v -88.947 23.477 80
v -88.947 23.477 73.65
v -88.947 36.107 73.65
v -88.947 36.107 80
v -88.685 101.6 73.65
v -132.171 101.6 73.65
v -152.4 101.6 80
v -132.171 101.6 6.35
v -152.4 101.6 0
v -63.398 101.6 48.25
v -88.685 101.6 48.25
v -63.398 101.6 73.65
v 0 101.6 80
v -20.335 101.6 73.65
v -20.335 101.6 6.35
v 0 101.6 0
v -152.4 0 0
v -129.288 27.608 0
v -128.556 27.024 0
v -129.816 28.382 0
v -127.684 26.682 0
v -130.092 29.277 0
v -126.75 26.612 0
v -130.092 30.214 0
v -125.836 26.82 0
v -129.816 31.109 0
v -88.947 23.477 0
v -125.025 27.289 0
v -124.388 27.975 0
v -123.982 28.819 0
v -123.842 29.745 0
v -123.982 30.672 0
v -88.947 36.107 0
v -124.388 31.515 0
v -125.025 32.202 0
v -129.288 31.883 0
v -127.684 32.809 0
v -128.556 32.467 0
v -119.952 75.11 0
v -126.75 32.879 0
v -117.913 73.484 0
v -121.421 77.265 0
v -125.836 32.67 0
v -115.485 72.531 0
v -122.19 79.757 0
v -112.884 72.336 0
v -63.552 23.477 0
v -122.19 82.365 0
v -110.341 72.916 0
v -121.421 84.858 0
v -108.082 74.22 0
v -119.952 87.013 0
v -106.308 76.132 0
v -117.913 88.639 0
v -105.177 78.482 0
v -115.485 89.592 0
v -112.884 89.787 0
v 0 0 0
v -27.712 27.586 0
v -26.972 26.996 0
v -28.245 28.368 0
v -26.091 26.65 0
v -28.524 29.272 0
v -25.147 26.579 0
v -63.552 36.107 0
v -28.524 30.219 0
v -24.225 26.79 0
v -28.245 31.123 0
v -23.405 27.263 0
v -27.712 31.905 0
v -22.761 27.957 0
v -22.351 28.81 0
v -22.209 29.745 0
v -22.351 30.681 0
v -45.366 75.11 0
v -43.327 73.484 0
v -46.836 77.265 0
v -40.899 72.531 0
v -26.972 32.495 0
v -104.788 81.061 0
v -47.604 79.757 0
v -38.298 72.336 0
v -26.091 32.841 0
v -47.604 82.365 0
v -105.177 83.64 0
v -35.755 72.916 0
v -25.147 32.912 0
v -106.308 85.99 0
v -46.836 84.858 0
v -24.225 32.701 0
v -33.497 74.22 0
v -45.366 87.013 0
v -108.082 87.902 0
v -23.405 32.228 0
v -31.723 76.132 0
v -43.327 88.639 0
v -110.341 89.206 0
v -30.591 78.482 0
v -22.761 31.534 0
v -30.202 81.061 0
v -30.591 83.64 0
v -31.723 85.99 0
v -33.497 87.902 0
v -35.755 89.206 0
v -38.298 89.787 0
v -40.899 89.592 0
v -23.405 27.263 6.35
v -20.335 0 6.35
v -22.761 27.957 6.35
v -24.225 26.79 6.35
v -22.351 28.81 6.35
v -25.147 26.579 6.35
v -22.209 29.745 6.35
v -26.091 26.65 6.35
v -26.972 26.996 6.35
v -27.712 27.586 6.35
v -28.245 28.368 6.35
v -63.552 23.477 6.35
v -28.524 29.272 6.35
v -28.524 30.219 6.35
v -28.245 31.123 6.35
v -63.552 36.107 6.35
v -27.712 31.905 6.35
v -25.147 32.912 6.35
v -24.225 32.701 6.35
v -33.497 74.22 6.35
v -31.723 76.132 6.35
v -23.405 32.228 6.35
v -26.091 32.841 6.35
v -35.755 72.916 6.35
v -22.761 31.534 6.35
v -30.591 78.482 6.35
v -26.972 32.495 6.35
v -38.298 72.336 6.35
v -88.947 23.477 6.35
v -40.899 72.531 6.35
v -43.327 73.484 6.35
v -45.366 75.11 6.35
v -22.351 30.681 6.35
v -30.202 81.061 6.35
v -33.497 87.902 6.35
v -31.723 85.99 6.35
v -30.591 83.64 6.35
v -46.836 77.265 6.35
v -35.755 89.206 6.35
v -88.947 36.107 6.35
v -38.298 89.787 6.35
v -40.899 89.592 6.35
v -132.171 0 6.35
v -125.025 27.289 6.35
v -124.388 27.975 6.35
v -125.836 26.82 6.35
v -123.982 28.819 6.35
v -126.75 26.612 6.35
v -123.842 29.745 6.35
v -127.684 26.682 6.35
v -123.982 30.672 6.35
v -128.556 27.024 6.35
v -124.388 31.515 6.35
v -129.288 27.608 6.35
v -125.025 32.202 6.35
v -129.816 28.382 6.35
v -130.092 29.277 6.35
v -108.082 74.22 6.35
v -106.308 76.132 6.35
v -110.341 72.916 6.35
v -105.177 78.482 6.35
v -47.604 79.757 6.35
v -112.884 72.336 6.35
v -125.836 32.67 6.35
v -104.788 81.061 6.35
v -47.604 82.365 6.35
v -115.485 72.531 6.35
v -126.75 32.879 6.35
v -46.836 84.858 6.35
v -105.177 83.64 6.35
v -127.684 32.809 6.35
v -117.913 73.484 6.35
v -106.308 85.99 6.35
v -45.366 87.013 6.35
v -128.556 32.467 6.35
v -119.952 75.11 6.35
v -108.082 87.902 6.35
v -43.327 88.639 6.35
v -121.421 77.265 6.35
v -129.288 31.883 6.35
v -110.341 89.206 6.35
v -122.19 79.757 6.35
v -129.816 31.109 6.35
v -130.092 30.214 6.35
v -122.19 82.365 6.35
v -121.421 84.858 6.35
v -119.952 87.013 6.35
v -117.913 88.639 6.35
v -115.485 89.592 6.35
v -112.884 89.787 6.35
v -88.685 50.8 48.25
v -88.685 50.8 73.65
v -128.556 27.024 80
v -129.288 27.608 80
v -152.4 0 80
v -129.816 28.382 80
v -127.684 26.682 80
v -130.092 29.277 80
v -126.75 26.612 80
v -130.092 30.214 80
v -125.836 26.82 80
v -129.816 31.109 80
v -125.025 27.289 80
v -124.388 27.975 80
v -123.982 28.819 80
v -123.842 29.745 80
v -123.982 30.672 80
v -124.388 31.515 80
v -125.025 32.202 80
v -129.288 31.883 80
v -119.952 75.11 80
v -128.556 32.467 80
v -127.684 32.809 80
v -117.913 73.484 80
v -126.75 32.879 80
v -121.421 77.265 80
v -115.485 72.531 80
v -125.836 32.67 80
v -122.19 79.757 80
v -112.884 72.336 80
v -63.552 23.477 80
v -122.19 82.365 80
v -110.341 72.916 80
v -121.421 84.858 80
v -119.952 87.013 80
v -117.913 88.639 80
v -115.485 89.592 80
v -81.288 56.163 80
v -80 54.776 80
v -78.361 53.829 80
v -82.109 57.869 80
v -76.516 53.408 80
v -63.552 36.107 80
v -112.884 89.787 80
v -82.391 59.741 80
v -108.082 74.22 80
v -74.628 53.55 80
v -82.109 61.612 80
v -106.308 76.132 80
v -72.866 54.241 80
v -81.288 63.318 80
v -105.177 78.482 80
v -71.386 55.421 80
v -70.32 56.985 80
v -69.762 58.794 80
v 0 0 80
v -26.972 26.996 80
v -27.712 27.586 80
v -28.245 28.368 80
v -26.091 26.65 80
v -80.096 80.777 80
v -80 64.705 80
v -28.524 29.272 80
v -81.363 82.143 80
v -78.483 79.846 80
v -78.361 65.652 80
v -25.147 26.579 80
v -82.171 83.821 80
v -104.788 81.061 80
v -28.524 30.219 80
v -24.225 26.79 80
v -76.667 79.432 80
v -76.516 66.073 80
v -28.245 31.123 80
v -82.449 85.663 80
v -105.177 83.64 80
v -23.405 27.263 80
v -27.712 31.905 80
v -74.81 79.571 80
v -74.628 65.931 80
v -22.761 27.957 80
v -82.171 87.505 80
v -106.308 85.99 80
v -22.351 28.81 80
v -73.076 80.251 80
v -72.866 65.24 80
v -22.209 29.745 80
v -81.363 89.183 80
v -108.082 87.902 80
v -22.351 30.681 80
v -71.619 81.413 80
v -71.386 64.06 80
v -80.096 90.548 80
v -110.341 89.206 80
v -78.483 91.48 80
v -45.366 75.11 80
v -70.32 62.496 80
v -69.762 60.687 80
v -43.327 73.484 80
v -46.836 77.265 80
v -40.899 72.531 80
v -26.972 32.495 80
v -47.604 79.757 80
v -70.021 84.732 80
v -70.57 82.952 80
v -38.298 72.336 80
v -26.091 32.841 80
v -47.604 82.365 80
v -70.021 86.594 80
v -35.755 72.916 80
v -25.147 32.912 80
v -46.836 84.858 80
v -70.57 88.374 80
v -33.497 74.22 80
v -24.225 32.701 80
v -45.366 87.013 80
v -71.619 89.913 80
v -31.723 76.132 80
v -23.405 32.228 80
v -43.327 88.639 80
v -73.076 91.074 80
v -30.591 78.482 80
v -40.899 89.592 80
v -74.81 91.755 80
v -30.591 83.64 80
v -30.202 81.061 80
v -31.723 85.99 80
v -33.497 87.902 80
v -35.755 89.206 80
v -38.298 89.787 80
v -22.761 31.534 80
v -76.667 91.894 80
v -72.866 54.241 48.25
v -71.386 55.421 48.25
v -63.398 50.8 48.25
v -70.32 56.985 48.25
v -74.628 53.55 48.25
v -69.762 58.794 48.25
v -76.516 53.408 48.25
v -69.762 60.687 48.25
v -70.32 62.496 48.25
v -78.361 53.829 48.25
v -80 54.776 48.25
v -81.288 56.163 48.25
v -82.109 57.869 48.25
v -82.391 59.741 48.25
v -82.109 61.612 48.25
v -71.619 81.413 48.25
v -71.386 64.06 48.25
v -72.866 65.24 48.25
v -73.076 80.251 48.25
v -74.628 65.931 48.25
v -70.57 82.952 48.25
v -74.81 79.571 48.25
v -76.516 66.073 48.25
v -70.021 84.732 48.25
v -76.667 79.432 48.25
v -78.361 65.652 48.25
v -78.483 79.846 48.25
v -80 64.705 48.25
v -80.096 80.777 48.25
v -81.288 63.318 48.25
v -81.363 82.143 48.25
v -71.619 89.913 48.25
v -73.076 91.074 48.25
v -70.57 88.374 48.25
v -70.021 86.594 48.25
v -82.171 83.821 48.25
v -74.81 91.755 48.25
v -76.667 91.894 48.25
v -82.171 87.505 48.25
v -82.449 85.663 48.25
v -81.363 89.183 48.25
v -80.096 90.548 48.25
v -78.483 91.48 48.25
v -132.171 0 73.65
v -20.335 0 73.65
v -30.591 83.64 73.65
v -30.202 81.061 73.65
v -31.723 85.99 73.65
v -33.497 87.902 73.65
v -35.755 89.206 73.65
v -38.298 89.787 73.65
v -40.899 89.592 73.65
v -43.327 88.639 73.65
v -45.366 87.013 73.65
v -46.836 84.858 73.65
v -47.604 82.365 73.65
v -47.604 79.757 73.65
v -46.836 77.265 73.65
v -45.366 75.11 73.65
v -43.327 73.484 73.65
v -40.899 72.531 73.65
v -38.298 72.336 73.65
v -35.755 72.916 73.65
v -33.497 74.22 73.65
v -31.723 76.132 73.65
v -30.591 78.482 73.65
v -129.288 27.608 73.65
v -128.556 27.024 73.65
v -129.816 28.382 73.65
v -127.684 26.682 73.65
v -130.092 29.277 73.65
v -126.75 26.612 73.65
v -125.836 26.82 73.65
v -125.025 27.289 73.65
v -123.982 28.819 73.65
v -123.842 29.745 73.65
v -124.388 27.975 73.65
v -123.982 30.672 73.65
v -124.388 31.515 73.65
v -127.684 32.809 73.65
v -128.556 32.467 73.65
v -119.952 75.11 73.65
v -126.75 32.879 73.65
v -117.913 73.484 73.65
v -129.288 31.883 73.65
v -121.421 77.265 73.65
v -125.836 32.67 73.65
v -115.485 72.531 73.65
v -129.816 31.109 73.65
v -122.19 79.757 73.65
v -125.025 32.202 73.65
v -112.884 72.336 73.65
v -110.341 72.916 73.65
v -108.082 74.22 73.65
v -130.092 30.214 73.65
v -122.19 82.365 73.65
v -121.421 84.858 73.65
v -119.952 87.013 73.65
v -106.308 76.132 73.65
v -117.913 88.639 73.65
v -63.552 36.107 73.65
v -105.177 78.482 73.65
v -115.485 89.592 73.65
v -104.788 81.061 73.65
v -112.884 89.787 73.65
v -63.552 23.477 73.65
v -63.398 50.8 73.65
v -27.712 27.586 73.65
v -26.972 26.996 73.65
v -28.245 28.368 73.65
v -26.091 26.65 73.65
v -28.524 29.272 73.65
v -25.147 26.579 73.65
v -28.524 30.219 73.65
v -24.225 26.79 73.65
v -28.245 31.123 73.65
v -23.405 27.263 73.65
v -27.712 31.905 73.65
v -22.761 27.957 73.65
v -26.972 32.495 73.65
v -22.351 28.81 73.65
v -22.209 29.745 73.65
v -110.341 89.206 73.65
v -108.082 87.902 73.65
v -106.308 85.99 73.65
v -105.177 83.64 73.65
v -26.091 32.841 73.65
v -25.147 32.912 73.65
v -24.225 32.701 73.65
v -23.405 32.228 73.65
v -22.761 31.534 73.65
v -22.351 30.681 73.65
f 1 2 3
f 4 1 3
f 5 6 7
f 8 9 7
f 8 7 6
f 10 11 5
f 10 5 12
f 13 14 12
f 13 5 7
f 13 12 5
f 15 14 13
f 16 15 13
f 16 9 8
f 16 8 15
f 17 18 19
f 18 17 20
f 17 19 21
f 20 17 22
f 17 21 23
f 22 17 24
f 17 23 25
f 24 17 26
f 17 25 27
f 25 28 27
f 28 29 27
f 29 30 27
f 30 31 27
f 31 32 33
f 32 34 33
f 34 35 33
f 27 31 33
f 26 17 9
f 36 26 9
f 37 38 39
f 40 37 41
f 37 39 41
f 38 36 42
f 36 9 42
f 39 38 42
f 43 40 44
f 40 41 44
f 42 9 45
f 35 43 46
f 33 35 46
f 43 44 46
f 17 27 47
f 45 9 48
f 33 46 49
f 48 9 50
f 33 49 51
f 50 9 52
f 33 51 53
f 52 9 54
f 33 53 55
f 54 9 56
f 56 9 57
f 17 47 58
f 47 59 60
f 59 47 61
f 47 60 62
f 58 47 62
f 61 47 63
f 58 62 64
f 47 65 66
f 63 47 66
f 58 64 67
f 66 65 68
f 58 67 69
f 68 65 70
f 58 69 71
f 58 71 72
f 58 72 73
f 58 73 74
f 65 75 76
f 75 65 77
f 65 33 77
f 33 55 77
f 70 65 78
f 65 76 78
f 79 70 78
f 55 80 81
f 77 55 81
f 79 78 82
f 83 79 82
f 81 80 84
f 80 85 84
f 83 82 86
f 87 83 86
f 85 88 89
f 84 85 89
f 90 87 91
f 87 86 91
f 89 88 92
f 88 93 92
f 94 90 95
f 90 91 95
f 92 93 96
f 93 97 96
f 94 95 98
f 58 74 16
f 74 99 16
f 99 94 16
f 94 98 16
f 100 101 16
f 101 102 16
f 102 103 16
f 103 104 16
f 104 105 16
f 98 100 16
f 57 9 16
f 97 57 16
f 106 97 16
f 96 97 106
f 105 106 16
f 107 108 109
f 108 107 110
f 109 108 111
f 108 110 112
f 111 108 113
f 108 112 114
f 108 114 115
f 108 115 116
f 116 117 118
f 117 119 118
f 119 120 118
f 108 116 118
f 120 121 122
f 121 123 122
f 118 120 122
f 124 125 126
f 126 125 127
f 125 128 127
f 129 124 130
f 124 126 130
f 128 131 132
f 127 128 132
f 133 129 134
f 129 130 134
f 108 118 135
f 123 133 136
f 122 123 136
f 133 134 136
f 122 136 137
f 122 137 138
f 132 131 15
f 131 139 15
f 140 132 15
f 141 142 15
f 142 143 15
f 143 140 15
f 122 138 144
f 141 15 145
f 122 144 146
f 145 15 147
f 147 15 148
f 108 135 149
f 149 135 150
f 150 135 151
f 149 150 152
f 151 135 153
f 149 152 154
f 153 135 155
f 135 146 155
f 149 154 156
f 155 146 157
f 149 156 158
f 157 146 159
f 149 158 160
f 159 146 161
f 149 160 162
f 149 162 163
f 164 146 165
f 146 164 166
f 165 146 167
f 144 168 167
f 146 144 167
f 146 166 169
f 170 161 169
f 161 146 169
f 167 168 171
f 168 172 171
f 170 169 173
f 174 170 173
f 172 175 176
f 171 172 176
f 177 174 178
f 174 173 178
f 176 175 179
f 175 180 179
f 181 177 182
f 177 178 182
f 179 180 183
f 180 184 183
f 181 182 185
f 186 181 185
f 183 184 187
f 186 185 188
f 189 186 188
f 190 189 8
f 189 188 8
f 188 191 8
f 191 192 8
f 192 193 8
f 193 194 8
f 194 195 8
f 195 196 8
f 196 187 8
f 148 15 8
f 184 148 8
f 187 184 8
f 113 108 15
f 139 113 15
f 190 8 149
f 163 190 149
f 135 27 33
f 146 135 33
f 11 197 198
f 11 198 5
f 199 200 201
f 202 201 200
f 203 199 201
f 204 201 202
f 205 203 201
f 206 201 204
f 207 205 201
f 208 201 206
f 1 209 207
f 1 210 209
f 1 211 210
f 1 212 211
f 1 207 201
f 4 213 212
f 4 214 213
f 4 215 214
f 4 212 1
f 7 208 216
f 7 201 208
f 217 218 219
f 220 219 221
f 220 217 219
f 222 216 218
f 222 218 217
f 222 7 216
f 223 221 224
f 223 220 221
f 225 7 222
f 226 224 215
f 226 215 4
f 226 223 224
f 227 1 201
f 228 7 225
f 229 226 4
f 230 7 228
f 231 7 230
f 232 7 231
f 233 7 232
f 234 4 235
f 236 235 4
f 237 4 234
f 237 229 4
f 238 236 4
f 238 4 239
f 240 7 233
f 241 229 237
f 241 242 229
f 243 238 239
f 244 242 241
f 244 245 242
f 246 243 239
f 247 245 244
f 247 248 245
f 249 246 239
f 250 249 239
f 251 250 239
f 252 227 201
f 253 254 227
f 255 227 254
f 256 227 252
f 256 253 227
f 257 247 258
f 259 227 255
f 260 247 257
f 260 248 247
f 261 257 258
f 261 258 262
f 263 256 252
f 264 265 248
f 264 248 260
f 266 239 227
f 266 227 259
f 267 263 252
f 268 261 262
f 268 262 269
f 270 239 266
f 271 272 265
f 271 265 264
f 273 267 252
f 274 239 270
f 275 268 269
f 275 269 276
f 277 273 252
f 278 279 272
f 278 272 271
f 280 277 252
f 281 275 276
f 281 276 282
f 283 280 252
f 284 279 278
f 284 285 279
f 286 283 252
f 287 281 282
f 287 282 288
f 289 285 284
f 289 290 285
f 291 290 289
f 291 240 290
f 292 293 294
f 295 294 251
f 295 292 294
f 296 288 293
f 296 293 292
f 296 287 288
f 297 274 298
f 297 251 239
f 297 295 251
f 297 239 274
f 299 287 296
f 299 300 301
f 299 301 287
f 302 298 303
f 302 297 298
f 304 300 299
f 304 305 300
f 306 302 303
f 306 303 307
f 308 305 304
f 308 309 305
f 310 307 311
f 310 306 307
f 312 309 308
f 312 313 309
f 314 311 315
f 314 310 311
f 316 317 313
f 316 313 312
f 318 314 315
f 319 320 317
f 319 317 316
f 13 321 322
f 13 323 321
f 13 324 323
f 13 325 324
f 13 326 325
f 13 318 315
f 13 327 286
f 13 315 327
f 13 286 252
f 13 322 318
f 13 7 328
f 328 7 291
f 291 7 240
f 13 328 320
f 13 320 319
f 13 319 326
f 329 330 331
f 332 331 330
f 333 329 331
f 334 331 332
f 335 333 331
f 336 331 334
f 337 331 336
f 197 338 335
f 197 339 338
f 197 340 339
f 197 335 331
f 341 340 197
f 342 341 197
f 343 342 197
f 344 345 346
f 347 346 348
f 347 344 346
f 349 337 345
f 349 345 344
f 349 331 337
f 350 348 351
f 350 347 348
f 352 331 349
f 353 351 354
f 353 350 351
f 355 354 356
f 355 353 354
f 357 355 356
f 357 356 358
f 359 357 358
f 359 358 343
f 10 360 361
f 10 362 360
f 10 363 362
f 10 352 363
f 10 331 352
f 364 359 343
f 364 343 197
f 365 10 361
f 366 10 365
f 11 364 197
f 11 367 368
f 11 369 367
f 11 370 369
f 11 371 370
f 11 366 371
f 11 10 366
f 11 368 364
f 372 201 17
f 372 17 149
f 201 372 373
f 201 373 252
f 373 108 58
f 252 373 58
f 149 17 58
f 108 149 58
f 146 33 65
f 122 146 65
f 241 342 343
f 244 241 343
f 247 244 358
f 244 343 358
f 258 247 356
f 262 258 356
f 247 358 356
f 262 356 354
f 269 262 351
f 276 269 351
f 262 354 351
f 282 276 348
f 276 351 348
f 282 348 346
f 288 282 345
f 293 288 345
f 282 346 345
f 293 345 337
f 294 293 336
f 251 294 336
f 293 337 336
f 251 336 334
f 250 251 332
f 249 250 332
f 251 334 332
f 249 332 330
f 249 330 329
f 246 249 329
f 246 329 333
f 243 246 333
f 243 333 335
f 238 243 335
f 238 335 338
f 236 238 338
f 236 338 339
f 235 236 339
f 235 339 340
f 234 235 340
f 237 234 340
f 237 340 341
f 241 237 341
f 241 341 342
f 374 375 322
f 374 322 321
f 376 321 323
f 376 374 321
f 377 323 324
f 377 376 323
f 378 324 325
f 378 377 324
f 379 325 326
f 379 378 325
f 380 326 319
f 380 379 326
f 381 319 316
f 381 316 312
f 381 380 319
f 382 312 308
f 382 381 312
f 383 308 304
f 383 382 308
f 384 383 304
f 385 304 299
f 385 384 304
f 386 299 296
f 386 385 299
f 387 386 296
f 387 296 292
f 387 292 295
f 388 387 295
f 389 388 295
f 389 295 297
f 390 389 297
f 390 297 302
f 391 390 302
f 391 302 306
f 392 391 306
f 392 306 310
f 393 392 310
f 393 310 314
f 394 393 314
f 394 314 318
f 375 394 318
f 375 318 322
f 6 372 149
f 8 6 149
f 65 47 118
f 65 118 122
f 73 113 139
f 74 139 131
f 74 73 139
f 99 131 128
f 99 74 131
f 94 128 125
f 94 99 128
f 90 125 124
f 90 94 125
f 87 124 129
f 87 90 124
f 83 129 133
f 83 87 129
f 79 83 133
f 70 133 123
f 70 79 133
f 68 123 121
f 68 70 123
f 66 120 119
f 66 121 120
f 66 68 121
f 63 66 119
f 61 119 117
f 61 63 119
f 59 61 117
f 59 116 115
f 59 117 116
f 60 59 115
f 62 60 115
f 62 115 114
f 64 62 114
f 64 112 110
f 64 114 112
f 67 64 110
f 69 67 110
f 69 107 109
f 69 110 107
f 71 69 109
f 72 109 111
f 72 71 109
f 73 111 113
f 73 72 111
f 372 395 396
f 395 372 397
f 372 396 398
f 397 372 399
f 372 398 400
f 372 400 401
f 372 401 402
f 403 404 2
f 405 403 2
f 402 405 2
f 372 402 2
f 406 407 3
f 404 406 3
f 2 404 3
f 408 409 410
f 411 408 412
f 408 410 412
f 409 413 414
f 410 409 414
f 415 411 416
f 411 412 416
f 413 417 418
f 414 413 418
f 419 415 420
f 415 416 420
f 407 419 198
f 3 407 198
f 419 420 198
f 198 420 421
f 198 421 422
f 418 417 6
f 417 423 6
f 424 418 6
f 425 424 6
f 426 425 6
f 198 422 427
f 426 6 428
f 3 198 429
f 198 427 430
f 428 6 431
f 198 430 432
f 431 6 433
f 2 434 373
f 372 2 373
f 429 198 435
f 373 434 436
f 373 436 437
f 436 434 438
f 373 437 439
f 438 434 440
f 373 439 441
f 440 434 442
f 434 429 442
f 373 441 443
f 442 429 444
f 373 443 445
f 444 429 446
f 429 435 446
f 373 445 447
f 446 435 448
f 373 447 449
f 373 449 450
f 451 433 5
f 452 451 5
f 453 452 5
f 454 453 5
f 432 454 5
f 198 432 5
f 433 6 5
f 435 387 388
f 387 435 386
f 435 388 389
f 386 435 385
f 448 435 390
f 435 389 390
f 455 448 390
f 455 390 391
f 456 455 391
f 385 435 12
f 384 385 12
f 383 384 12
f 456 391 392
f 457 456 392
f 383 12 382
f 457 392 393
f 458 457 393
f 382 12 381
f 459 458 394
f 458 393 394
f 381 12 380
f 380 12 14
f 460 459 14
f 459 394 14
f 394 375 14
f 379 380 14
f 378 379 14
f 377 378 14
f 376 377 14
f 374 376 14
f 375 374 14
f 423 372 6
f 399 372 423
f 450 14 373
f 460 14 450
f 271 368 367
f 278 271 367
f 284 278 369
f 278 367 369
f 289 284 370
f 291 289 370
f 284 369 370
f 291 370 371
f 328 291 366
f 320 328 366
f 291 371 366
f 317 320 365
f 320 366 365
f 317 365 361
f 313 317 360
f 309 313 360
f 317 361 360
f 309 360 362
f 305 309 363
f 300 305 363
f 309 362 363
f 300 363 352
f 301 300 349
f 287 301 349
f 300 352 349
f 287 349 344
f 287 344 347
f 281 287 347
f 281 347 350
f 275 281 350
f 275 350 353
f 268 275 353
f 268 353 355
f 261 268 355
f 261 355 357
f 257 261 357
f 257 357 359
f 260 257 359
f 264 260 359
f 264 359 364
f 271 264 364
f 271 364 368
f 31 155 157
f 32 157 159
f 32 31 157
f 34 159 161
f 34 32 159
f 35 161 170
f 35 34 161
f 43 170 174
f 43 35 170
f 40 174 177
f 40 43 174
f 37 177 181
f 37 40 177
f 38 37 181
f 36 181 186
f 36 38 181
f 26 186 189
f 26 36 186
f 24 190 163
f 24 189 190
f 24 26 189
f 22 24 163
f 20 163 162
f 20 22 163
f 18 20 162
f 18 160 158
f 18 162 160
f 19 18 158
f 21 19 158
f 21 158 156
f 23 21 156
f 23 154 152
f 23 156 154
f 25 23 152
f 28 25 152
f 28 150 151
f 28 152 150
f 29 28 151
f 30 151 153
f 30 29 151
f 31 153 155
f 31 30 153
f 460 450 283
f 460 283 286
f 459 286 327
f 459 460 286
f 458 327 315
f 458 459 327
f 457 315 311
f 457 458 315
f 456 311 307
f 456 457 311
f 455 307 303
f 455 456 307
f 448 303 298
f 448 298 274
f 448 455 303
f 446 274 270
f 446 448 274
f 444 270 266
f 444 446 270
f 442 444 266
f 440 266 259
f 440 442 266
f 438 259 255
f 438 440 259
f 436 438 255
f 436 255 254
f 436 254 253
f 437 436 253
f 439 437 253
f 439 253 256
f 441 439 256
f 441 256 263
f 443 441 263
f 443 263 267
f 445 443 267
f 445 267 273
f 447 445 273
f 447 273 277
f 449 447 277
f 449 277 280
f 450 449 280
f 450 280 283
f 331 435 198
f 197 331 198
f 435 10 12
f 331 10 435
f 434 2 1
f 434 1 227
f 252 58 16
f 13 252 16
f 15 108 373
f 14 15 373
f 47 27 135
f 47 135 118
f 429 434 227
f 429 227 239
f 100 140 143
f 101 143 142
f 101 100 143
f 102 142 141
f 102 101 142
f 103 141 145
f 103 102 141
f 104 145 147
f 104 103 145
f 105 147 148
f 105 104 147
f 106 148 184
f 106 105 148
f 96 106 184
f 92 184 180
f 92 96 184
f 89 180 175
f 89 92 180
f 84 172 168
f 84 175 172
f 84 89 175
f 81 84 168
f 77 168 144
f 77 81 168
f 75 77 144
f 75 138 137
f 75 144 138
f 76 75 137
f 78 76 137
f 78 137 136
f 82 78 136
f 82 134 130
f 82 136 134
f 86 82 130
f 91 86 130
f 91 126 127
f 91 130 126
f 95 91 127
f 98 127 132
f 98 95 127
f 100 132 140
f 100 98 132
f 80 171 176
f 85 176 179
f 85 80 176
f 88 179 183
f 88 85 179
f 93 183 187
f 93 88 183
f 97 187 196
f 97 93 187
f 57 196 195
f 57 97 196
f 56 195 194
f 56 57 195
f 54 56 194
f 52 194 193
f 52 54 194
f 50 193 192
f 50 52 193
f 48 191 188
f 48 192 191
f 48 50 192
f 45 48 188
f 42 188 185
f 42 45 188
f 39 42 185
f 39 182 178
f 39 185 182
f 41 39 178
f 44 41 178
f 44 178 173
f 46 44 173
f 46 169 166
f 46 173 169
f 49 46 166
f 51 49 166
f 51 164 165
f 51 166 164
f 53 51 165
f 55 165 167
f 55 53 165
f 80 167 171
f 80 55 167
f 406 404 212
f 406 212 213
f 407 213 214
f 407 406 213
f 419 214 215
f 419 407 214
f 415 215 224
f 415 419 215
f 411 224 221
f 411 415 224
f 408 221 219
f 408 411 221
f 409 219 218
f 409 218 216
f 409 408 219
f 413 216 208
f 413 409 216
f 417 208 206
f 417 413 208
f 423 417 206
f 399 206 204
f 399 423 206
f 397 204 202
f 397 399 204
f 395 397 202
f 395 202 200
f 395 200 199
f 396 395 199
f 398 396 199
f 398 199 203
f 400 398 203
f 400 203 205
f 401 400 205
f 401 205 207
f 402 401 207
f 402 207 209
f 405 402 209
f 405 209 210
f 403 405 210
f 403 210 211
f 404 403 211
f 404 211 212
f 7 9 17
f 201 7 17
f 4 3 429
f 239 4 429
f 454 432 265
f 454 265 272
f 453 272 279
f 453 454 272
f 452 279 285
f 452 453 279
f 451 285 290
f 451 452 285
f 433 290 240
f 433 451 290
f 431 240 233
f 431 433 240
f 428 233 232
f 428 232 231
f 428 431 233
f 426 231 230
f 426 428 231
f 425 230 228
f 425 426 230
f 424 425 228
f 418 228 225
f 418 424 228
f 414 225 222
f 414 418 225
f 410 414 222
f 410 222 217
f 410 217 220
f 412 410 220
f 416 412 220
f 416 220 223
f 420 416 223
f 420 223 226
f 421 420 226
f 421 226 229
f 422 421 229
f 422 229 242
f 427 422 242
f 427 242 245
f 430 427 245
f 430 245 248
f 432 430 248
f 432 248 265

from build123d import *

# Parameters (mm, degrees)
SKETCH2_R           = 8.75000028
SKETCH2_R_2         = 3.175
SKETCH2_W           = 25.3952265
SKETCH2_H           = 12.629529533
SKETCH2_R_3         = 3.142219065
BOSS_EXTRUDE1_DEPTH = 80.000094
CUT_EXTRUDE2_DEPTH  = 179.822094
SKETCH6_R           = 6.35
SKETCH6_R_2         = 6.248785159
CUT_EXTRUDE6_DEPTH  = 41.402
BOSS_EXTRUDE4_START = 25.4
SKETCH6_10_R        = 6.35
SKETCH6_10_R_2      = 6.248785159
BOSS_EXTRUDE4_DEPTH = 25.4


with BuildPart() as part:
    # Sketch2 → Boss-Extrude1 (new body)
    with BuildSketch(Plane.XY):
        Polygon((0, 0), (0, 81.061351085), (0, 101.6), (-152.4, 101.6), (-152.4, 81.061351085), (-152.4, 0), align=None)
        with Locations((-113.538, 81.061351085)):
            Circle(SKETCH2_R, mode=Mode.SUBTRACT)
        with Locations((-38.952133661, 81.061351085)):
            Circle(SKETCH2_R, mode=Mode.SUBTRACT)
        with Locations((-25.384472284, 29.74542377)):
            Circle(SKETCH2_R_2, mode=Mode.SUBTRACT)
        with Locations((-76.249140265, 29.791740678)):
            Rectangle(SKETCH2_W, SKETCH2_H, mode=Mode.SUBTRACT)
        with Locations((-126.984472284, 29.74542377)):
            Circle(SKETCH2_R_3, mode=Mode.SUBTRACT)
    extrude(amount=BOSS_EXTRUDE1_DEPTH)

    # Sketch3 → Cut-Extrude2 (cut)
    with BuildSketch(Plane(origin=(0, 101.6, 0), x_dir=(1, 0, 0), z_dir=(0, 1, 0))):
        Polygon((-132.170994975, -73.650094), (-76.2, -73.650094), (-20.334810309, -73.650094), (-20.334810309, -6.35), (-76.2, -6.35), (-132.170994975, -6.35), align=None)
    extrude(amount=-CUT_EXTRUDE2_DEPTH, mode=Mode.SUBTRACT)

    # Sketch6 → Cut-Extrude6 (cut)
    with BuildSketch(Plane(origin=(0, 0, 73.650094), x_dir=(-1, 0, 0), z_dir=(0, 0, -1))):
        with Locations((76.041292075, 59.740546456)):
            Circle(SKETCH6_R)
        with Locations((76.2, 85.662840915)):
            Circle(SKETCH6_R_2)
    extrude(amount=-CUT_EXTRUDE6_DEPTH, mode=Mode.SUBTRACT)

    # Sketch6<10> → Boss-Extrude4 (add)
    with BuildSketch(Plane(origin=(0, 0, 73.650094), x_dir=(-1, 0, 0), z_dir=(0, 0, -1)).offset(BOSS_EXTRUDE4_START)):
        Polygon((76.2, 101.6), (63.397560696, 101.6), (63.397560696, 50.8), (88.685023454, 50.8), (88.685023454, 101.6), align=None)
        with Locations((76.041292075, 59.740546456)):
            Circle(SKETCH6_10_R, mode=Mode.SUBTRACT)
        with Locations((76.2, 85.662840915)):
            Circle(SKETCH6_10_R_2, mode=Mode.SUBTRACT)
    extrude(amount=-BOSS_EXTRUDE4_DEPTH)


solid = part.part
